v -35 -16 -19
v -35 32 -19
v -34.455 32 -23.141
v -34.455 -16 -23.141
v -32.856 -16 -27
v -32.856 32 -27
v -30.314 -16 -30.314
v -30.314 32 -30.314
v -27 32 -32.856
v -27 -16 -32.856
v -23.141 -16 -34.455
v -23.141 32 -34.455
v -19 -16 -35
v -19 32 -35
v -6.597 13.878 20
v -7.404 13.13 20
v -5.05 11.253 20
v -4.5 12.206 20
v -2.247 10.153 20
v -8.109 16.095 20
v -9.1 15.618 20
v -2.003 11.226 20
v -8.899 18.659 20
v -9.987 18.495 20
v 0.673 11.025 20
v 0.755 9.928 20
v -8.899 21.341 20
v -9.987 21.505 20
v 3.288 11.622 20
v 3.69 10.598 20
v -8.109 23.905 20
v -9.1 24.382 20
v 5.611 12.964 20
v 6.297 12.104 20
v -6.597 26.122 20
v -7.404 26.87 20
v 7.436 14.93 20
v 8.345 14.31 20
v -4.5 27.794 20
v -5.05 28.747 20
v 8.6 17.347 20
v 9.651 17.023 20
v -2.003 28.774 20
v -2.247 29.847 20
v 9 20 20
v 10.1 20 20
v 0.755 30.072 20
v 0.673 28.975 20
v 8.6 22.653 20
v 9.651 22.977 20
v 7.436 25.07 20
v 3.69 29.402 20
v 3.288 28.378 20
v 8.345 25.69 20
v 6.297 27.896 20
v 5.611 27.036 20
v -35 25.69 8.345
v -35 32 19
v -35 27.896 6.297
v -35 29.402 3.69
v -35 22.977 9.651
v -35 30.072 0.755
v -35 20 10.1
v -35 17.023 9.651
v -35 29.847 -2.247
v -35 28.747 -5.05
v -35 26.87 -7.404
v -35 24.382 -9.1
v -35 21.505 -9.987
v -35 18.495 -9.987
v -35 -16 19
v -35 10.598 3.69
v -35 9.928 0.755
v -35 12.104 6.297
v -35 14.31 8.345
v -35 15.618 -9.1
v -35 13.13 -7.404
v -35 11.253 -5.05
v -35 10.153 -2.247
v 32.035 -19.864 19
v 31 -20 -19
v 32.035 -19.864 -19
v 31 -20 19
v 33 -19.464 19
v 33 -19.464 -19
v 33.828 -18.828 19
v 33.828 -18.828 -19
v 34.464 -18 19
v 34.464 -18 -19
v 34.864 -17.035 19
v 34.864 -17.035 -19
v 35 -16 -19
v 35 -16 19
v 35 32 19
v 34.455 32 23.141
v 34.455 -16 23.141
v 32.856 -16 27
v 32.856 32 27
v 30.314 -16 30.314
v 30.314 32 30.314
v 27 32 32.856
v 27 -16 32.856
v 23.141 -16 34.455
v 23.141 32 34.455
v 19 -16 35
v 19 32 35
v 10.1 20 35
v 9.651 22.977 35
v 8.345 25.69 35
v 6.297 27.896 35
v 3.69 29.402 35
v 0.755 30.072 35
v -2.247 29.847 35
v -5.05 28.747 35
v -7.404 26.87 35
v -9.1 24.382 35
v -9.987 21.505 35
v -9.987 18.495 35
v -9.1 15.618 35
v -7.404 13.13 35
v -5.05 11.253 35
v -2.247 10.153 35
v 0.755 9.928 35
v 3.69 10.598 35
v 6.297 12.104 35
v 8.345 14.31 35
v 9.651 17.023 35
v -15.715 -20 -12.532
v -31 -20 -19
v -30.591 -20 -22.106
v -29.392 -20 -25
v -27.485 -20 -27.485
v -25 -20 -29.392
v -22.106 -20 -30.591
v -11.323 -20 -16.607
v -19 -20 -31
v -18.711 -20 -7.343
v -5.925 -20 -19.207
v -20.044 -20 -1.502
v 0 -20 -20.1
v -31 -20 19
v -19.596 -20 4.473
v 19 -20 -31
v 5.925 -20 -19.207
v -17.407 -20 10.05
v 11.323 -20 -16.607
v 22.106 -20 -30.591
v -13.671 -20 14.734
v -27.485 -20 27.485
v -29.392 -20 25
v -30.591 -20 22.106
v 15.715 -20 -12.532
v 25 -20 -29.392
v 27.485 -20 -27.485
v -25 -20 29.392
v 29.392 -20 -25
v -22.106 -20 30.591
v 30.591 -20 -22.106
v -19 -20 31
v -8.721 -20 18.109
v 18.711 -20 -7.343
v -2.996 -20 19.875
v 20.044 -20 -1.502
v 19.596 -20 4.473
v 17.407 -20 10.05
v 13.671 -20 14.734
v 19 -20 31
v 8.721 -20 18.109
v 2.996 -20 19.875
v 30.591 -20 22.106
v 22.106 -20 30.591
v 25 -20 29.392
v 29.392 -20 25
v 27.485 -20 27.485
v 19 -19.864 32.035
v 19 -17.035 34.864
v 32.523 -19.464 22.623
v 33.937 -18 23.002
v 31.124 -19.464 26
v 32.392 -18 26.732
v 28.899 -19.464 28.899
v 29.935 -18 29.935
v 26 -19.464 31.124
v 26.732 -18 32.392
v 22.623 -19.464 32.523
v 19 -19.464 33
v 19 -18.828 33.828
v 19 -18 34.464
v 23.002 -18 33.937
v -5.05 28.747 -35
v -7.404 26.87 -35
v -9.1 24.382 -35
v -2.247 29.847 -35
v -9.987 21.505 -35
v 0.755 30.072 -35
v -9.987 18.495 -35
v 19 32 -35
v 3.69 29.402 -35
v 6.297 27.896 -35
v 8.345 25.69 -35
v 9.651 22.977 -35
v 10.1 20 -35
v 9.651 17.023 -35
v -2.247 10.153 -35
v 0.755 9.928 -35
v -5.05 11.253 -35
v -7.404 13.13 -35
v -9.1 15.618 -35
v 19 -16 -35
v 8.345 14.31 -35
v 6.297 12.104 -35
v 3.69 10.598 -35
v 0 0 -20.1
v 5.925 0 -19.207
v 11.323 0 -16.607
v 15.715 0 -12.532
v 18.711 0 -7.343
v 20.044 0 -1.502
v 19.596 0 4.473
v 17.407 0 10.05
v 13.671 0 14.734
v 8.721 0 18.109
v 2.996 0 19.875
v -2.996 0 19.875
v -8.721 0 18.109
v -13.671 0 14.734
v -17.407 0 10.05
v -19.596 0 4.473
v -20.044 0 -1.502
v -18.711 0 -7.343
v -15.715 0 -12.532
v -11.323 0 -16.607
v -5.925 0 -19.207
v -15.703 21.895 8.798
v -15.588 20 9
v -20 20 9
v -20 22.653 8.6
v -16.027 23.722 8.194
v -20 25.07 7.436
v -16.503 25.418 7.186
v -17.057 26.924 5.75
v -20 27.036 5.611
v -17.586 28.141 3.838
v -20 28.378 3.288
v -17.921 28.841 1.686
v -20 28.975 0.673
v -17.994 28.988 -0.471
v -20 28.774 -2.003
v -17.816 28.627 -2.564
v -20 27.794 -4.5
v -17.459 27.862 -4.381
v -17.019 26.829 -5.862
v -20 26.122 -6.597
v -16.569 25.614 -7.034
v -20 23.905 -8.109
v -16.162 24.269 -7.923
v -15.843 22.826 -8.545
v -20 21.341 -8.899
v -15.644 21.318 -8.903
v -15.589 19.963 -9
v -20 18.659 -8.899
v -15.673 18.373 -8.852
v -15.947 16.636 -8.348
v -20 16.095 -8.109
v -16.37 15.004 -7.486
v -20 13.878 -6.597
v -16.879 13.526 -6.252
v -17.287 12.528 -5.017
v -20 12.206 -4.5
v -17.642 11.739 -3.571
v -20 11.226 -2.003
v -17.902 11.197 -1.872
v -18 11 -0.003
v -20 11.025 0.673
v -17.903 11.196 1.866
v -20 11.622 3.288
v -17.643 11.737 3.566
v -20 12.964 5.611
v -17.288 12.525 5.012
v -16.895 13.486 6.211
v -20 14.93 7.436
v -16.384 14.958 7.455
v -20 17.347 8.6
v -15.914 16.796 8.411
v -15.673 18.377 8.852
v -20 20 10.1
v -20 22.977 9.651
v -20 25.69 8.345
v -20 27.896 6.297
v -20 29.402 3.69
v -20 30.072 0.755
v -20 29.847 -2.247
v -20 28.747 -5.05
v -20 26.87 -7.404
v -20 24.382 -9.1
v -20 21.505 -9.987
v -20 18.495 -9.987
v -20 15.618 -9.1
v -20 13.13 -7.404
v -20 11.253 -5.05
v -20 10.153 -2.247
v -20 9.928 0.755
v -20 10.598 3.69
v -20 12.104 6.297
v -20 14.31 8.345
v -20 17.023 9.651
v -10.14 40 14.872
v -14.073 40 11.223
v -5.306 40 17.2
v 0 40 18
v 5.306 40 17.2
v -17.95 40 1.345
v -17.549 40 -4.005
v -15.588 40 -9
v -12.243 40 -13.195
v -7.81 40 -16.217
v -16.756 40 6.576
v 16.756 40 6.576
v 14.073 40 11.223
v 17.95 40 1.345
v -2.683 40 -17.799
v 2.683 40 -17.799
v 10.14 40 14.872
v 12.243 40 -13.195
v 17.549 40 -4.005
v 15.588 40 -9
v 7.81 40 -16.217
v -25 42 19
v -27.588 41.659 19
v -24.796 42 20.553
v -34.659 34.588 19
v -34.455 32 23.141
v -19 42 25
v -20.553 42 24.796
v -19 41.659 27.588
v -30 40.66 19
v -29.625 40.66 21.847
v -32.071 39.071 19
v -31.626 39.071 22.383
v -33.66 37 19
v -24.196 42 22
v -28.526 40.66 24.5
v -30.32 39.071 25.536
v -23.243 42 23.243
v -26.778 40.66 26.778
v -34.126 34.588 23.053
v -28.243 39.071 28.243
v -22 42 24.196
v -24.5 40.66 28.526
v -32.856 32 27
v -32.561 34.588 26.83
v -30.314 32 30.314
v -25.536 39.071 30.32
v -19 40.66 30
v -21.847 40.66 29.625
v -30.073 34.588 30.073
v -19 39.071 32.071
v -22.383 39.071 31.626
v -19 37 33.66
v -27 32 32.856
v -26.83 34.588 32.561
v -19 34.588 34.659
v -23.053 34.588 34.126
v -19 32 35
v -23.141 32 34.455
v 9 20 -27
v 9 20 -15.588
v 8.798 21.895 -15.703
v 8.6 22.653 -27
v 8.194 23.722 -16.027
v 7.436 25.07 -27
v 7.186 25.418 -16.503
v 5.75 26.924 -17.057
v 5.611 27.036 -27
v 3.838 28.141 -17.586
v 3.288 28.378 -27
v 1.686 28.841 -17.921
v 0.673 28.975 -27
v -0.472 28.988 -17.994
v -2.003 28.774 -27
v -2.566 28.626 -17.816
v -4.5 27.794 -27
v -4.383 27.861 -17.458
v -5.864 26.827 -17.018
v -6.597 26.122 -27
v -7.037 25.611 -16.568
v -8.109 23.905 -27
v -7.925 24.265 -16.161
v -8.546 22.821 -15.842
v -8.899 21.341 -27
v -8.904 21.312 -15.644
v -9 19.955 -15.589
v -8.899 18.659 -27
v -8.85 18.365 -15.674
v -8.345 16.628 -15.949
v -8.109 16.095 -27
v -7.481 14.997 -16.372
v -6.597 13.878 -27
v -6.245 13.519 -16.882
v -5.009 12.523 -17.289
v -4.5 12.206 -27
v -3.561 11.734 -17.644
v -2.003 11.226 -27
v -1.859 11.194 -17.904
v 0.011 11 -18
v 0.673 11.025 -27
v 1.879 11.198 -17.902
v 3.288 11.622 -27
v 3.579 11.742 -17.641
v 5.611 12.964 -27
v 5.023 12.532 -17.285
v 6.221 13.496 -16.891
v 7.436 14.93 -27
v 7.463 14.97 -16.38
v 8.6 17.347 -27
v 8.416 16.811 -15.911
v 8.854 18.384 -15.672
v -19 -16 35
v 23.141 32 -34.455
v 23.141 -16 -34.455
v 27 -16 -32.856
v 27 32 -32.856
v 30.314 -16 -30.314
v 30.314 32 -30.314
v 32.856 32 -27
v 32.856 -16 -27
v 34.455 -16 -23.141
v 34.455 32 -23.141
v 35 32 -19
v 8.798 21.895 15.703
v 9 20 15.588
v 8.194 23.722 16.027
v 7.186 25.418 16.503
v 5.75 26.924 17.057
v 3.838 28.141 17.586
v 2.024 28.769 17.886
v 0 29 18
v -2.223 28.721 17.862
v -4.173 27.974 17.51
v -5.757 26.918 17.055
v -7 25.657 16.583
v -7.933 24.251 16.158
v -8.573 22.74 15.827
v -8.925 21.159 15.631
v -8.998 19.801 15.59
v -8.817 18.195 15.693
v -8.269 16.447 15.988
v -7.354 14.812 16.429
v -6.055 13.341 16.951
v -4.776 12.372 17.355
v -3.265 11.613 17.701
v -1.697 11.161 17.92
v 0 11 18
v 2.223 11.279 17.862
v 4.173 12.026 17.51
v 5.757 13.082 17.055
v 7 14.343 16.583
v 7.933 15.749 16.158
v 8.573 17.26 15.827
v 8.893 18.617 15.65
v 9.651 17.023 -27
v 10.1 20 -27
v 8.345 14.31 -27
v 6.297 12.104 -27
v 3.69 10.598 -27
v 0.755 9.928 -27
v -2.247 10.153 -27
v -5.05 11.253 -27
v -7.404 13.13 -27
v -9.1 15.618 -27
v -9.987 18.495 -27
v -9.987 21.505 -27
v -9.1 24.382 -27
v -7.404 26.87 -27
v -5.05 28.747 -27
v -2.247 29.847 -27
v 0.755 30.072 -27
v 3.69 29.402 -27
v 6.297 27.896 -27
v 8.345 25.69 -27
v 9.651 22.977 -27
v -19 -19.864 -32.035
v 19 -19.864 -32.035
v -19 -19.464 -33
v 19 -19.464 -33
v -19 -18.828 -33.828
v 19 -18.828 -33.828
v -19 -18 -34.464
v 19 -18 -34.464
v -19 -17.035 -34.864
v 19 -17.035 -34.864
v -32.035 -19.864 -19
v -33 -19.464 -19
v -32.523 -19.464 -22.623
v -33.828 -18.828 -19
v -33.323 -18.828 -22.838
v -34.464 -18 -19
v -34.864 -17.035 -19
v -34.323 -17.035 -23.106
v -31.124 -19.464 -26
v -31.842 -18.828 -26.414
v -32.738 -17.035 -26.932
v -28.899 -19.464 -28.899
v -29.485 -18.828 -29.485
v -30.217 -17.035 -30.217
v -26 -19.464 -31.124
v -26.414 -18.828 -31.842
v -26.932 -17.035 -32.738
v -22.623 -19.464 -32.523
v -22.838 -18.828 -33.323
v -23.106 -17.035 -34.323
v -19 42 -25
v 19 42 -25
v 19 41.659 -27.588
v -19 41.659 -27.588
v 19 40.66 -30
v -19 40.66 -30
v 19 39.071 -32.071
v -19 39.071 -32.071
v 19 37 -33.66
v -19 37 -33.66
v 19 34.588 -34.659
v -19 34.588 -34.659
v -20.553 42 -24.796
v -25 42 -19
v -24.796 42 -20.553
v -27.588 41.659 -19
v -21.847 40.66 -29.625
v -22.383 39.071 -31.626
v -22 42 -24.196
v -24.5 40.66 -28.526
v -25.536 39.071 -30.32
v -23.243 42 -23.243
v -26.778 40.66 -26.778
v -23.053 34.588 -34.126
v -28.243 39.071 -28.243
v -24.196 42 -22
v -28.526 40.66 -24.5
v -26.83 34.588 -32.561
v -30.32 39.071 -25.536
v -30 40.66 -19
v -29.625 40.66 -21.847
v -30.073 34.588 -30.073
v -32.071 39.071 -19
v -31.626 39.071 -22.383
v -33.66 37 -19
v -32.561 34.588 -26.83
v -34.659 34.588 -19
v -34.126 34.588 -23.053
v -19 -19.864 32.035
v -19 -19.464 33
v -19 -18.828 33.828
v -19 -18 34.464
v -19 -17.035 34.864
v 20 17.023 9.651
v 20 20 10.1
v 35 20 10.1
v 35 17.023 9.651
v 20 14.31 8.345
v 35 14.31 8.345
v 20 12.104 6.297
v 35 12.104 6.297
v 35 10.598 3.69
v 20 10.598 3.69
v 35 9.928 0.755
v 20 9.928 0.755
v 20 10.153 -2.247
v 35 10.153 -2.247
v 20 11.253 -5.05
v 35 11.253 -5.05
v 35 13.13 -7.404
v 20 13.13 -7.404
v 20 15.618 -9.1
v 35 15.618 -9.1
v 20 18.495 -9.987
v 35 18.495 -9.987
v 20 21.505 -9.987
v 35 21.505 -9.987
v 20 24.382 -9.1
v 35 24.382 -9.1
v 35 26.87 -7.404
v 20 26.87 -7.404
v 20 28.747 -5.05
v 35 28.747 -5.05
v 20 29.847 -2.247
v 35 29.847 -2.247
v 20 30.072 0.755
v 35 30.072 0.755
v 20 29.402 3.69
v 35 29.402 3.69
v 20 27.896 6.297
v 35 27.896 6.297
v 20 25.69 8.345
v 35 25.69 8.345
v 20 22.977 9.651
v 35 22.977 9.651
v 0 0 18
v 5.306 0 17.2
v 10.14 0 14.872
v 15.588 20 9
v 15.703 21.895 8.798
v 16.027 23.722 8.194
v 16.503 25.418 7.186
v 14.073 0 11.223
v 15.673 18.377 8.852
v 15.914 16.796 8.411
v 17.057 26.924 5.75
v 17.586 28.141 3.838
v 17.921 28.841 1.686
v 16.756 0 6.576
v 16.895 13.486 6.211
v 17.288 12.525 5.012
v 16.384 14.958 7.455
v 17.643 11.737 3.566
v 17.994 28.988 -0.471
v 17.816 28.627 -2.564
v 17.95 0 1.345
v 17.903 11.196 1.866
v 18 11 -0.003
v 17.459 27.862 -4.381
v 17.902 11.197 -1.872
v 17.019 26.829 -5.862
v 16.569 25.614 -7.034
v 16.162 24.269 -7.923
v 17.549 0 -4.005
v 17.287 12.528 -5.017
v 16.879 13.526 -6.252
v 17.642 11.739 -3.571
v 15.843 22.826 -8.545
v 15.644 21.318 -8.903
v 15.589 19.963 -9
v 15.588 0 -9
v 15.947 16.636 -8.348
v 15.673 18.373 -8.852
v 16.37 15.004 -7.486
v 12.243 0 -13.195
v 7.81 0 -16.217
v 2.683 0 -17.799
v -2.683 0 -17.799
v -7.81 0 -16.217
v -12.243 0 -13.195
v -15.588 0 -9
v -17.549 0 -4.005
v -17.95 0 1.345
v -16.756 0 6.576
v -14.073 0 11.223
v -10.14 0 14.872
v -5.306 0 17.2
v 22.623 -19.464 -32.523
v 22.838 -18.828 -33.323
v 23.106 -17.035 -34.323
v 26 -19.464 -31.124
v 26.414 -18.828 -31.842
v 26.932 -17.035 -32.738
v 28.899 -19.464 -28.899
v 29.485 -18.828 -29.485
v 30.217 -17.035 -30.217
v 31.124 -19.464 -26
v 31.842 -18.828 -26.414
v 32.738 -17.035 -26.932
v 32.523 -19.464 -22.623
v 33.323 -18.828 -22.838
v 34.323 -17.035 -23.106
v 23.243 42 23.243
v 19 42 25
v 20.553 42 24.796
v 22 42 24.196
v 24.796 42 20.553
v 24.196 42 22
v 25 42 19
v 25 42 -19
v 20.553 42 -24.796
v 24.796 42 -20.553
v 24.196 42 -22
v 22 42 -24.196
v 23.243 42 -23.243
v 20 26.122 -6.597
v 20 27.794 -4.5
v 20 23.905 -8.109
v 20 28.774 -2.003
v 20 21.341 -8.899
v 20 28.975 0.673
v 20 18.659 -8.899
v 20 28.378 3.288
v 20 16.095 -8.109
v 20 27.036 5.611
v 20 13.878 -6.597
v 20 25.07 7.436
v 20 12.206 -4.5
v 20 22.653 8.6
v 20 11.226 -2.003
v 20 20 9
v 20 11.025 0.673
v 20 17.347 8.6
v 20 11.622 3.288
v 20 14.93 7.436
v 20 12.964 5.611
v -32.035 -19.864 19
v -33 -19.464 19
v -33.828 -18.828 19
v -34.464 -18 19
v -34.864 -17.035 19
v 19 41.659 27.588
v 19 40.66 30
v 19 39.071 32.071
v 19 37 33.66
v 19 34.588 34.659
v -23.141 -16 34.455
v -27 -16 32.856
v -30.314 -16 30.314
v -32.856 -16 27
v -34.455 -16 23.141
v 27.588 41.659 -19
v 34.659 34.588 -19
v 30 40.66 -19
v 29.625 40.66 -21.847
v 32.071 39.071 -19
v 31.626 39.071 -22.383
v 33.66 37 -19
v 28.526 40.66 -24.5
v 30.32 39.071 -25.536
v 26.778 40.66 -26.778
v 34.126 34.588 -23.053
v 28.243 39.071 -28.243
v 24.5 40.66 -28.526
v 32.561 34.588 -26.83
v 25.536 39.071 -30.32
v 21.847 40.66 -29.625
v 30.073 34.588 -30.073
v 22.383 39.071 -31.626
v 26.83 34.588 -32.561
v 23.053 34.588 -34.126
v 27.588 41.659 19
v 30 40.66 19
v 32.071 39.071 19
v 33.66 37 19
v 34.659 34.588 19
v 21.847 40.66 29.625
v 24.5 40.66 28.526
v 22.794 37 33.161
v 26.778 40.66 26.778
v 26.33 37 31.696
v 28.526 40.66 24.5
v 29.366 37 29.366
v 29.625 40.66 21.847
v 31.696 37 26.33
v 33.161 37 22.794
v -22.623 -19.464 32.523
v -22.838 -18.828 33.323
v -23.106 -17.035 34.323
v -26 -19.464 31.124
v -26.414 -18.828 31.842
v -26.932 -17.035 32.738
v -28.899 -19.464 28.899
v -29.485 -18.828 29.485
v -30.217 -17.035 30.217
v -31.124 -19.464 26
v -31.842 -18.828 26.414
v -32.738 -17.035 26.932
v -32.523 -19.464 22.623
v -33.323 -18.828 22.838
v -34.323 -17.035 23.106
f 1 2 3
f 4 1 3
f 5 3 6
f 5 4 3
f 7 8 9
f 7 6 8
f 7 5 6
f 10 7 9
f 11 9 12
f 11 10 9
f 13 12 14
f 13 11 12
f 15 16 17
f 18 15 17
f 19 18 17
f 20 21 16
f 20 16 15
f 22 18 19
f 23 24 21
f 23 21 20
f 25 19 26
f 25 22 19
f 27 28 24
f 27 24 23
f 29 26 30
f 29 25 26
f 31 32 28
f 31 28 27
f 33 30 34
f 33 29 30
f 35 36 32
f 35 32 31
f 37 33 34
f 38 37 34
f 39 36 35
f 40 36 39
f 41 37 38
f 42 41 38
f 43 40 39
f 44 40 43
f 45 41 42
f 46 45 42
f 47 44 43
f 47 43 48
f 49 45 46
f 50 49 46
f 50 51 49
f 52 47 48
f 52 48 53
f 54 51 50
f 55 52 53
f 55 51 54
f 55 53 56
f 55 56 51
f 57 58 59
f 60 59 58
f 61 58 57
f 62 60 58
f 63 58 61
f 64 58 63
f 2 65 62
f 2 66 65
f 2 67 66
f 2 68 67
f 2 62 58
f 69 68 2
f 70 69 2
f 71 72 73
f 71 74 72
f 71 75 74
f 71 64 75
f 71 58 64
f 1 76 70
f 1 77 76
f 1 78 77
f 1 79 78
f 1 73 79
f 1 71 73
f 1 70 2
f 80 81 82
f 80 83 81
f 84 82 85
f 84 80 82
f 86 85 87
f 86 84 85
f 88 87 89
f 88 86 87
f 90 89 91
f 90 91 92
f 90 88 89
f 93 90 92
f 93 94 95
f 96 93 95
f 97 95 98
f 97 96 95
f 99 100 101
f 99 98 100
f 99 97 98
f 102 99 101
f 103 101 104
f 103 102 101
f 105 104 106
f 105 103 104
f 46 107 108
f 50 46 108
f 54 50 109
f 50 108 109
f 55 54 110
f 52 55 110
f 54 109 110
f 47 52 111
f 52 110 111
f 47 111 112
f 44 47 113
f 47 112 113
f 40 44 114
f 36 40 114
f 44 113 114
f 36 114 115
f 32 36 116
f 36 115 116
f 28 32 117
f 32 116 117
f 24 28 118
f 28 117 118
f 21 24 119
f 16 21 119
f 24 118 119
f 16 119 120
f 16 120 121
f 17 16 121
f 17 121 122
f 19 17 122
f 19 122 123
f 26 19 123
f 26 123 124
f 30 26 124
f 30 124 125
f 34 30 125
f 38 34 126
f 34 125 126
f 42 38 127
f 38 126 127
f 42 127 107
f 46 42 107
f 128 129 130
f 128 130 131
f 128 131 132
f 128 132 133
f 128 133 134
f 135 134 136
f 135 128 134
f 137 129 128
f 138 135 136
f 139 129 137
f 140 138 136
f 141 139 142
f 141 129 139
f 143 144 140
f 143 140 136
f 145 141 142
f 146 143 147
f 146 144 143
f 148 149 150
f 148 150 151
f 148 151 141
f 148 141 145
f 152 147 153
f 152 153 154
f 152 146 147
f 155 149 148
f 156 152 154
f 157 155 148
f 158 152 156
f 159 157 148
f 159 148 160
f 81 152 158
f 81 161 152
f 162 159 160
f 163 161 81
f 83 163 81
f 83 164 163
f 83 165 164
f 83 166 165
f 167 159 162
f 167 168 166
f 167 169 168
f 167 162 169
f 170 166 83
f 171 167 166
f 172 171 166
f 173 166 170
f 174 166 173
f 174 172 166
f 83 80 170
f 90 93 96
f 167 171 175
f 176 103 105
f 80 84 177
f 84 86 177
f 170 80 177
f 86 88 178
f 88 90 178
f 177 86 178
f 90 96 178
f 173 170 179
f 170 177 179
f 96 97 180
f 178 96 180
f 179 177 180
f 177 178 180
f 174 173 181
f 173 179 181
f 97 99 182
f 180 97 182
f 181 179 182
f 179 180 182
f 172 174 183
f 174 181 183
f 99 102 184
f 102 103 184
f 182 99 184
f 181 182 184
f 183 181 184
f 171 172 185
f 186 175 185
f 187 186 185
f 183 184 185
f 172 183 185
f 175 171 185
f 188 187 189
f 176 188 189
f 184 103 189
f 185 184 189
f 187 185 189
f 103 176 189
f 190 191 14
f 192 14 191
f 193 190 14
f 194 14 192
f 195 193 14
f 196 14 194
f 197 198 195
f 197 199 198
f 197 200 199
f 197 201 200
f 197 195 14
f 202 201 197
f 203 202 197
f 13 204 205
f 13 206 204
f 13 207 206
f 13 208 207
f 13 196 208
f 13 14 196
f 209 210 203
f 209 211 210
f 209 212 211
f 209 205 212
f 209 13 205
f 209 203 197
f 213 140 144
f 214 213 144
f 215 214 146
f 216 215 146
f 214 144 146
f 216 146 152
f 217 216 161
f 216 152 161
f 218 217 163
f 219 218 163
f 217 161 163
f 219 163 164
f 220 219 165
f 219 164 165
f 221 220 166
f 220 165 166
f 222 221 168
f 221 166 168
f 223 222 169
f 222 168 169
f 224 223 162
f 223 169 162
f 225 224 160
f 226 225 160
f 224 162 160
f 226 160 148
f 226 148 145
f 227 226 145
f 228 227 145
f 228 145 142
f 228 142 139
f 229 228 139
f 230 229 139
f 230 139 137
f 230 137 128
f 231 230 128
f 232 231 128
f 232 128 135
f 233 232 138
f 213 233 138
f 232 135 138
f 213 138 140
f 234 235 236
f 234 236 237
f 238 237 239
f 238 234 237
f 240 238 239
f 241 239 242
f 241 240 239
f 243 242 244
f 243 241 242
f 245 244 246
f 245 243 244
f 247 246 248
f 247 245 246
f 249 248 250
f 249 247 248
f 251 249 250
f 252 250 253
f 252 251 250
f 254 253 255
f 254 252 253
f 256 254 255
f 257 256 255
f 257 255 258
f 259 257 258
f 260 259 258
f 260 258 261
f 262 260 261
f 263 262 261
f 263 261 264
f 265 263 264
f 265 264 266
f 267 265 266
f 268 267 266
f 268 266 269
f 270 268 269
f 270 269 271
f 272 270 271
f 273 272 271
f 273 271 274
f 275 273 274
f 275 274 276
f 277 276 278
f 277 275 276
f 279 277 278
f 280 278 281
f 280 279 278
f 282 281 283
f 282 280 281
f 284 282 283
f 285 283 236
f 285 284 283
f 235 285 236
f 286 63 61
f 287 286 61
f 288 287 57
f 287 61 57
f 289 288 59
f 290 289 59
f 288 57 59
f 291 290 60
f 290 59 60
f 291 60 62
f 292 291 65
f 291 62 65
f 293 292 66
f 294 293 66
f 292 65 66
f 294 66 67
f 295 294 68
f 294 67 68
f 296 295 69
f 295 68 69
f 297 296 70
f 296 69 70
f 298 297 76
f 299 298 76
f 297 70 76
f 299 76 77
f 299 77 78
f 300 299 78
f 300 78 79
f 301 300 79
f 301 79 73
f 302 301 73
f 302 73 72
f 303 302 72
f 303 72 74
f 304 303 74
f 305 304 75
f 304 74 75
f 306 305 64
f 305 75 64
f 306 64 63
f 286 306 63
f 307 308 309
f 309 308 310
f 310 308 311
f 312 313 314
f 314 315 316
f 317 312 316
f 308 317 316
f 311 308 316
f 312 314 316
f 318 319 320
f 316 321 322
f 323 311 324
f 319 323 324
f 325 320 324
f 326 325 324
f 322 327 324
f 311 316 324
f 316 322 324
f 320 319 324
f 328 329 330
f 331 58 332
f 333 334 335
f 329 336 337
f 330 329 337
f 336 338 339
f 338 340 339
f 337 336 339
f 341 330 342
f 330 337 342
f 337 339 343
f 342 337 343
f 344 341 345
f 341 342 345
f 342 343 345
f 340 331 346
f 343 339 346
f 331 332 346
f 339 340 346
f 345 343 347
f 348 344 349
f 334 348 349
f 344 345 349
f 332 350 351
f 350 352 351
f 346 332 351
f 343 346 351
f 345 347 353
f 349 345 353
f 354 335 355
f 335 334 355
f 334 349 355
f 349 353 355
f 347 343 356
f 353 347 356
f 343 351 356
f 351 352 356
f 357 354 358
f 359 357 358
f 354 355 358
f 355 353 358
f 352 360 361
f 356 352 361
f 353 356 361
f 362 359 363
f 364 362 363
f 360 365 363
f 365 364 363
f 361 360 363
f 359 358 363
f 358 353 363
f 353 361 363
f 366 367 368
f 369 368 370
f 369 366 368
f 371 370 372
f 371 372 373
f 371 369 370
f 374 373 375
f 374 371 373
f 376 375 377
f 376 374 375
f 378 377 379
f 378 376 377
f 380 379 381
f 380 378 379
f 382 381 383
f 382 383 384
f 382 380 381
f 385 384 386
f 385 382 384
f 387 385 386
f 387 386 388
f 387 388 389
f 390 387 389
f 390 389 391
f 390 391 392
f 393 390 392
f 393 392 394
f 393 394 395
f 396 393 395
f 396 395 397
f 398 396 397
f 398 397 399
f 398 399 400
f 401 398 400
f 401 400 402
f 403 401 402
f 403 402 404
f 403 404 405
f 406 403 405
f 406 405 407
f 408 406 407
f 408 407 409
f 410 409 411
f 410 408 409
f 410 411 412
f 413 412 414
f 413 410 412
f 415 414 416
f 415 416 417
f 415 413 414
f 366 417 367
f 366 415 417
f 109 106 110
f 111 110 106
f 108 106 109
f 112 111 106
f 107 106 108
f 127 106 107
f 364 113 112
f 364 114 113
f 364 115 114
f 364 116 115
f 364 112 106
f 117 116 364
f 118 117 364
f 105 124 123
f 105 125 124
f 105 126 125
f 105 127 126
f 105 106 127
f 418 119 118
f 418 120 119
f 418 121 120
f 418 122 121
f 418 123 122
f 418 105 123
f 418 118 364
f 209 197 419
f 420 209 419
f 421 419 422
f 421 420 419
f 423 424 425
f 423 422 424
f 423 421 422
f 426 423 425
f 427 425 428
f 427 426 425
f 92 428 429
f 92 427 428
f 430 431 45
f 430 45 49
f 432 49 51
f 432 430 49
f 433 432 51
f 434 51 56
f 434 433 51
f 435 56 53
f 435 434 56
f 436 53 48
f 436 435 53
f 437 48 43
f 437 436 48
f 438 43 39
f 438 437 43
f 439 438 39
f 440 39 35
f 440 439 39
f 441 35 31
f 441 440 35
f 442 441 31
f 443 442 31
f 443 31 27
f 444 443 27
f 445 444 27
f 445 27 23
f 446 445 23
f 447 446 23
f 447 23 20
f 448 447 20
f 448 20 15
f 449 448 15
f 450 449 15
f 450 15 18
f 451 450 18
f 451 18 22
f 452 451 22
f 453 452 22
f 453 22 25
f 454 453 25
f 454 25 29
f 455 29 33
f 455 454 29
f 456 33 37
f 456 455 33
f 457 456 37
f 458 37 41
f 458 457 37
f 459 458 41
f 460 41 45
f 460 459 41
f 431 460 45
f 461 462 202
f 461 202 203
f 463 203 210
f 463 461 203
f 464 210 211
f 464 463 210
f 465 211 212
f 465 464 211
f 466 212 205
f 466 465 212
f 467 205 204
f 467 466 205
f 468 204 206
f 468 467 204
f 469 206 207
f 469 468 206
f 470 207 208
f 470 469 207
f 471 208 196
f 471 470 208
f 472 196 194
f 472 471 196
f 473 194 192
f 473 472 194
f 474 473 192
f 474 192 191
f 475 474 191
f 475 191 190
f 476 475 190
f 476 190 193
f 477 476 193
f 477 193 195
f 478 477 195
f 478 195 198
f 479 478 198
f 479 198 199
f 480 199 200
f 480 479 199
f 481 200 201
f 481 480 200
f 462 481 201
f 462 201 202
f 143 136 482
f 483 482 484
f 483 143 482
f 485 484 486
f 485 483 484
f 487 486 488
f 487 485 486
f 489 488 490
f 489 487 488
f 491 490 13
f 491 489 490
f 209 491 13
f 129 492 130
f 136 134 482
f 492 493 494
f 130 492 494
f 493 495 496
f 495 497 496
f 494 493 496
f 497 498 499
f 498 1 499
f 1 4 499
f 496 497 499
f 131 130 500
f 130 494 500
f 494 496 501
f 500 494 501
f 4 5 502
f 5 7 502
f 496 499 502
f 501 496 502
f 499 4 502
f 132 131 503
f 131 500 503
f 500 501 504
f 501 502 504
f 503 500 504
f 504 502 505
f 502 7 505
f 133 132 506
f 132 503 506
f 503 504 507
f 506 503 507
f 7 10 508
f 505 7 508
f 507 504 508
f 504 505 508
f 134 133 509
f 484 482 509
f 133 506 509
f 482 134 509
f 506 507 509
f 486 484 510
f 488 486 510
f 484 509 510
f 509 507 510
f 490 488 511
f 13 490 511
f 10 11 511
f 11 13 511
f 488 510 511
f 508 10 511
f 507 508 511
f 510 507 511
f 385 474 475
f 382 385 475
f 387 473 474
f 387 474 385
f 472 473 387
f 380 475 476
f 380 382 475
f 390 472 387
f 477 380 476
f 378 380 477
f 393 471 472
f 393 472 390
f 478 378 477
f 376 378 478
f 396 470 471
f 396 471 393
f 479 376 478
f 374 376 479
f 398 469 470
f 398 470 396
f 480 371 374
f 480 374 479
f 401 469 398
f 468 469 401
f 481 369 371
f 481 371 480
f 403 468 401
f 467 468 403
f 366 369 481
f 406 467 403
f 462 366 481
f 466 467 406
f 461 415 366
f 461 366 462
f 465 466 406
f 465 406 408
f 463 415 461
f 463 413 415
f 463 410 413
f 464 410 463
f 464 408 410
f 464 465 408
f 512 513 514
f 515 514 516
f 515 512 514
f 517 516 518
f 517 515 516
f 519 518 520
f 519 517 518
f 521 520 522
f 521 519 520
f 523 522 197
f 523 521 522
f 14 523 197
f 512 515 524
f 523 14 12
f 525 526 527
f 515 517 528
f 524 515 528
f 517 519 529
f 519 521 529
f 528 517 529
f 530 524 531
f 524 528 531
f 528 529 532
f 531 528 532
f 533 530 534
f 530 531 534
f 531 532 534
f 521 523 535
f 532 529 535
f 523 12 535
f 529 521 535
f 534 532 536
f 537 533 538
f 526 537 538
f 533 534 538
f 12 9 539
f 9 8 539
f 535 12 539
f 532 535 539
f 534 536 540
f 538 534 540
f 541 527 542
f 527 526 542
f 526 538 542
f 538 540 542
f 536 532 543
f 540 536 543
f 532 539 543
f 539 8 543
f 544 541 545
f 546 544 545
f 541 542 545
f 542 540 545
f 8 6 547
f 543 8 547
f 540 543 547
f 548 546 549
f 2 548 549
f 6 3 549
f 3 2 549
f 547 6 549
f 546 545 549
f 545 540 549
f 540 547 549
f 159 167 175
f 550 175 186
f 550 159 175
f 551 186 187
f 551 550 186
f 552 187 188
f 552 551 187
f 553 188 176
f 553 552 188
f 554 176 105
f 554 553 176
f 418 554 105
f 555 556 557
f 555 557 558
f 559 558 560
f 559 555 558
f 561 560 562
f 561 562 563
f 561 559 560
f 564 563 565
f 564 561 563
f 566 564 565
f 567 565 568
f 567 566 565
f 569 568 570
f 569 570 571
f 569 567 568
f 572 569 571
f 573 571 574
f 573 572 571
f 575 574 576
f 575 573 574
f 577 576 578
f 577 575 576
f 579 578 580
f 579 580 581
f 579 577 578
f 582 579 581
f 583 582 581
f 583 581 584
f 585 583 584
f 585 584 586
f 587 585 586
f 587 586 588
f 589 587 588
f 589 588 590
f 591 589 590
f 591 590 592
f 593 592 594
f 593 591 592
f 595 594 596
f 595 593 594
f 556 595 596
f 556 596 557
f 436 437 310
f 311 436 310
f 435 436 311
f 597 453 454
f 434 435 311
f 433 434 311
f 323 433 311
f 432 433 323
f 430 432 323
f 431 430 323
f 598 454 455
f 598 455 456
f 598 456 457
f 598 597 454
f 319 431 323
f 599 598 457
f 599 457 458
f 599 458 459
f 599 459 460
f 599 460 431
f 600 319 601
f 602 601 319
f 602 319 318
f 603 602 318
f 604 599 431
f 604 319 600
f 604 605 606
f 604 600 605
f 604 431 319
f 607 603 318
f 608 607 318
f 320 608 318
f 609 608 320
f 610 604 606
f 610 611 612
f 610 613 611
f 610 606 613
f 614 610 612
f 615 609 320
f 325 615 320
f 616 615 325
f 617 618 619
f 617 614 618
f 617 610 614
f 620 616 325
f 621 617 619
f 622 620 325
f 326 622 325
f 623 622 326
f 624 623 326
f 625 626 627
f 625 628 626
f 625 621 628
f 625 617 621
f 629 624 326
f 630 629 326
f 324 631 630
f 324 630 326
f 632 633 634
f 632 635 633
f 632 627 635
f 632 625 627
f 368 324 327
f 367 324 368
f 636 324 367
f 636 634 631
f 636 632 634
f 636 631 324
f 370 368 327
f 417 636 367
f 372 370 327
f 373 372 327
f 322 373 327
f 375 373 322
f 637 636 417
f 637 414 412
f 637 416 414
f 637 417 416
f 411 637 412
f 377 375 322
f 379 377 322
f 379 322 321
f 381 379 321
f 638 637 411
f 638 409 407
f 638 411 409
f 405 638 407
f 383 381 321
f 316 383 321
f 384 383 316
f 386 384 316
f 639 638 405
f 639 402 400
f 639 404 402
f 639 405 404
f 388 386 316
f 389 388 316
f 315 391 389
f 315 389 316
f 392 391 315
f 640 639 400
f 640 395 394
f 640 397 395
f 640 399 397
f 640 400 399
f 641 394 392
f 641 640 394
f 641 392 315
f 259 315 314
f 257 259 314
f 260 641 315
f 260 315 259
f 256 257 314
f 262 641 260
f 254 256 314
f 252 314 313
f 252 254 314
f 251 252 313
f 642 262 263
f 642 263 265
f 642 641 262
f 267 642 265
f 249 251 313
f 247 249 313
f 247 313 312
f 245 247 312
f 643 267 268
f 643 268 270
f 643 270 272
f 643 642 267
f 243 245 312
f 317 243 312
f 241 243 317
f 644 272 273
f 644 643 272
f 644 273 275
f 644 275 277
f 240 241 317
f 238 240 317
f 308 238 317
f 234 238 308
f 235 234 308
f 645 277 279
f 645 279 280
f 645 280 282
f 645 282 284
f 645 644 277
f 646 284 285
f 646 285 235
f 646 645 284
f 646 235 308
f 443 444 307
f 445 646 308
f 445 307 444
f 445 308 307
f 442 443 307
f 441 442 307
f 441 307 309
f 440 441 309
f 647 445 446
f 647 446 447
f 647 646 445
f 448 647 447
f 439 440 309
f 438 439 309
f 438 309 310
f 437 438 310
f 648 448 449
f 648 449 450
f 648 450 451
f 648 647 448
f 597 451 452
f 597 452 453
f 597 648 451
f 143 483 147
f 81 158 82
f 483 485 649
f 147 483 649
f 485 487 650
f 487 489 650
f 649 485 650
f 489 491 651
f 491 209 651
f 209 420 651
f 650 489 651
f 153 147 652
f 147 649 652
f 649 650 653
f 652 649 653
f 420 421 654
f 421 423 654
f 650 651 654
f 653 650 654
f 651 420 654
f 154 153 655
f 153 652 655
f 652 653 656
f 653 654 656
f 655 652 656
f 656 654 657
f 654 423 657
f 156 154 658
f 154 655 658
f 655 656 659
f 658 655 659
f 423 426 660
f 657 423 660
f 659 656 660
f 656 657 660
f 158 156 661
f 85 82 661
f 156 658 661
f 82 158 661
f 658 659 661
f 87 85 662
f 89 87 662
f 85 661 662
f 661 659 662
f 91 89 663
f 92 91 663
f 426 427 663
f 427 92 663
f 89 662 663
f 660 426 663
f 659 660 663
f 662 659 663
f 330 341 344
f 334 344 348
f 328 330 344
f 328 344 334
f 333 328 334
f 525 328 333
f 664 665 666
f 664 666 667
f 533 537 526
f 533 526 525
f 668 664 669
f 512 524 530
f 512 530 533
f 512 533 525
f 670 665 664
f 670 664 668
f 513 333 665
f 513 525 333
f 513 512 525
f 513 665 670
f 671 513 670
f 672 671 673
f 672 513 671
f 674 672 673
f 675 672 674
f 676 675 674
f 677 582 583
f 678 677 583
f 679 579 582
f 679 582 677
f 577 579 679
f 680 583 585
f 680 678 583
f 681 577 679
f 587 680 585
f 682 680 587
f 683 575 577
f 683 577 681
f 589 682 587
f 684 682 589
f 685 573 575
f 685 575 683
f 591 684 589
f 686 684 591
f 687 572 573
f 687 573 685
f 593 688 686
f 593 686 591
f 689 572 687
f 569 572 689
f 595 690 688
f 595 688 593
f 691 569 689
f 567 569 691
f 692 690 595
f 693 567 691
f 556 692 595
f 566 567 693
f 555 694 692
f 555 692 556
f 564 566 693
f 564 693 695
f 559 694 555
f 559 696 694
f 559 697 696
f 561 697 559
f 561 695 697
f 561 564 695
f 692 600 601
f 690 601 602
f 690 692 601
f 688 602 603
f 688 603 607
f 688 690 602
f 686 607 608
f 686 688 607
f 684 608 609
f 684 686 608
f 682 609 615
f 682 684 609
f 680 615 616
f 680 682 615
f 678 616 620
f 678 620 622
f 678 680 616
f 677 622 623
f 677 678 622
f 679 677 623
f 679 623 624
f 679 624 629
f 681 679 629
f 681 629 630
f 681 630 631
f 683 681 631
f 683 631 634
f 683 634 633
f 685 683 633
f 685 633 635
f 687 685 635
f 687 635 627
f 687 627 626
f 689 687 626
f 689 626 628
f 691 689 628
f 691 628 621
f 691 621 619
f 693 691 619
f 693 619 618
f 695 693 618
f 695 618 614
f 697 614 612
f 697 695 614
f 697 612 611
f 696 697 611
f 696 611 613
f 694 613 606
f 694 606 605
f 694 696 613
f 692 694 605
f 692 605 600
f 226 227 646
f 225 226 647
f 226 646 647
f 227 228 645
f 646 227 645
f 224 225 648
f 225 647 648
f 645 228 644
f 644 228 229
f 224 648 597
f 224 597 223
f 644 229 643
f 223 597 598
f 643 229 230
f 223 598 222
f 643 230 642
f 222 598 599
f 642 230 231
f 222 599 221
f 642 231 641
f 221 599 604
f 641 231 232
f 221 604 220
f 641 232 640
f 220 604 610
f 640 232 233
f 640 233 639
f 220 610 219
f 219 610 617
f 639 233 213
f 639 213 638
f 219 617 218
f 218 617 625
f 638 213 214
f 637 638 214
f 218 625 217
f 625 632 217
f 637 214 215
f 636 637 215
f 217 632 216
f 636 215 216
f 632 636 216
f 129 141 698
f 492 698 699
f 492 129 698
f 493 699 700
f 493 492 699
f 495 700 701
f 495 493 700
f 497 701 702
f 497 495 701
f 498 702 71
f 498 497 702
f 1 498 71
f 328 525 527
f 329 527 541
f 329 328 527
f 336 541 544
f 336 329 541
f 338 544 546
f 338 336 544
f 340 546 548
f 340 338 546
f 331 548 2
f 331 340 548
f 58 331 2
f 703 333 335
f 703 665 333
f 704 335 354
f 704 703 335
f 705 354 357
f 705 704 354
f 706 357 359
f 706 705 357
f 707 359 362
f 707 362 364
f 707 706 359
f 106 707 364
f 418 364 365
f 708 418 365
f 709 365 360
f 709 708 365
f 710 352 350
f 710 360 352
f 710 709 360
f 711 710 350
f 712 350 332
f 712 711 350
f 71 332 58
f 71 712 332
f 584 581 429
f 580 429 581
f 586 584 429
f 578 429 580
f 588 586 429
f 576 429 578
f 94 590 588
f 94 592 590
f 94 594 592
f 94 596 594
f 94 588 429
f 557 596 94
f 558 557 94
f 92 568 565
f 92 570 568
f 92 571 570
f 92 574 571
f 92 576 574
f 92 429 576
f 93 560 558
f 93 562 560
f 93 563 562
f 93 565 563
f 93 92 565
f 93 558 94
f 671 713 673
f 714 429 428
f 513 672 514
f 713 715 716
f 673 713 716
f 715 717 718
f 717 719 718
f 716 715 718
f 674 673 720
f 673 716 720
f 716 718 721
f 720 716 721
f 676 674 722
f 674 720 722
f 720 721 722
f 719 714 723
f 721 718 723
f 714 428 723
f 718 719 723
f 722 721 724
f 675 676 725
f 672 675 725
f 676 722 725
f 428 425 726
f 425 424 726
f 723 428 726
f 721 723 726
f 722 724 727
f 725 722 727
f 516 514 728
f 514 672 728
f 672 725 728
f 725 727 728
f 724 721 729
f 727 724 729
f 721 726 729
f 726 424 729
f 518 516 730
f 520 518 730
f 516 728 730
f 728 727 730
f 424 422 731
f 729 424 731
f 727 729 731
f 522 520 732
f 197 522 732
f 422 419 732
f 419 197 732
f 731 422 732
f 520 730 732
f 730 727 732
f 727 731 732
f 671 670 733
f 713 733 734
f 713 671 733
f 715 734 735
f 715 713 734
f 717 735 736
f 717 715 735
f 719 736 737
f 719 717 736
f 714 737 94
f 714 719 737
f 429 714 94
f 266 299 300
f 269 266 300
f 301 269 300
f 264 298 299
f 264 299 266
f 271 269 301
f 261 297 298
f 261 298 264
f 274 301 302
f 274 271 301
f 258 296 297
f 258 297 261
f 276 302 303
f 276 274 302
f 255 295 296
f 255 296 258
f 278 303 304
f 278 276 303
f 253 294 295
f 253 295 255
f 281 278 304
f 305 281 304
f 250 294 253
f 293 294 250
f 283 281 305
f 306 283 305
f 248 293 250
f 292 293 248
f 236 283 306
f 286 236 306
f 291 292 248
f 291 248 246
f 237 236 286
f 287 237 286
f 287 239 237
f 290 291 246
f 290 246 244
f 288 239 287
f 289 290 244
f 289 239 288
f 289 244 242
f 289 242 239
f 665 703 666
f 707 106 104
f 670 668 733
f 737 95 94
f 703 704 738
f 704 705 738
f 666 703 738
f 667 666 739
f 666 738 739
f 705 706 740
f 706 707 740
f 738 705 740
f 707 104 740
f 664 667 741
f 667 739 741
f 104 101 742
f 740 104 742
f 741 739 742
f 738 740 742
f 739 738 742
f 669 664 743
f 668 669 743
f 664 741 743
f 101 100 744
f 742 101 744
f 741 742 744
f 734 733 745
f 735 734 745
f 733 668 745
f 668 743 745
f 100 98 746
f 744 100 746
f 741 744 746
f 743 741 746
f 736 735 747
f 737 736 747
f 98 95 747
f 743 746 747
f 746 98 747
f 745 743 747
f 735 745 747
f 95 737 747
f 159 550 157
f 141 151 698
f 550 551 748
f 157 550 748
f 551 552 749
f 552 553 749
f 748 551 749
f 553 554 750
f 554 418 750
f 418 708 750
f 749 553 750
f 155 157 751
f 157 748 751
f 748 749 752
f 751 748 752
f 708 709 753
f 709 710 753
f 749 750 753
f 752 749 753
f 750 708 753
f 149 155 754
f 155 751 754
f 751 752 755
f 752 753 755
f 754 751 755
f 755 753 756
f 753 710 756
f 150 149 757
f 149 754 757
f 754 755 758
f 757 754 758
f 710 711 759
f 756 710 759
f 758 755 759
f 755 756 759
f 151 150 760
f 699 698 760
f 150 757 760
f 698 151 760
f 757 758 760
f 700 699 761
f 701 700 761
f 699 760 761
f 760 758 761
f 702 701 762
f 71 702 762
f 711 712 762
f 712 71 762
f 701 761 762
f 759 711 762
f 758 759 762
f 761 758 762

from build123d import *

# Parameters (mm, degrees)
SKETCH_1_R               = 18
EXTRUDE_1_DEPTH          = 40
CUT_EXTRUDE_2_DEPTH      = 88.891979156
CUT_EXTRUDE_2_DEPTH_BACK = 88.891979156
SKETCH_2_R               = 9
SKETCH_3_R               = 10.1
CUT_EXTRUDE_3_DEPTH      = 15
CUT_EXTRUDE_START        = -15
SKETCH_4_R               = 10.1
CUT_EXTRUDE_4_DEPTH      = 15
CUT_EXTRUDE_5_DEPTH      = 88.891979202
CUT_EXTRUDE_5_DEPTH_BACK = 88.891979202
SKETCH_5_R               = 9
SKETCH_6_R               = 10.1
CUT_EXTRUDE_6_DEPTH      = 15
CUT_EXTRUDE_START_2      = -8
SKETCH_7_R               = 10.1
CUT_EXTRUDE_7_DEPTH      = 8
EXTRUDE_2_DEPTH          = 2
FILLET_1_R               = 10
EXTRUDE_START            = 20
SKETCH_10_R              = 20.1
EXTRUDE_3_DEPTH          = 20
FILLET_2_R               = 4


with BuildPart() as part:
    # Эскиз1 → Бобышка-Вытянуть1 (new body)
    with BuildSketch(Plane(origin=(0, 0, 0), x_dir=(1, 0, 0), z_dir=(0, 1, 0))):
        with BuildLine():
            Line((19, 35), (-19, 35))
            ThreePointArc((-19, 35), (-30.313708499, 30.313708499), (-35, 19))
            Line((-35, 19), (-35, -19))
            ThreePointArc((-35, -19), (-30.313708499, -30.313708499), (-19, -35))
            Line((-19, -35), (19, -35))
            ThreePointArc((19, -35), (30.313708499, -30.313708499), (35, -19))
            Line((35, -19), (35, 19))
            ThreePointArc((35, 19), (30.313708499, 30.313708499), (19, 35))
        make_face()
        with Locations(Location((0, 0, 0), (0, 0, 270))):
            Circle(SKETCH_1_R, mode=Mode.SUBTRACT)
    extrude(amount=EXTRUDE_1_DEPTH)

    # Эскиз2 → Вырез-Вытянуть2 (cut, two sides: drawn at the far end of the back side and taken through both)
    with BuildSketch(Plane.ZY.offset(35).offset(-CUT_EXTRUDE_2_DEPTH_BACK)):
        with Locations((0, 20)):
            Circle(SKETCH_2_R)
    extrude(amount=CUT_EXTRUDE_2_DEPTH + CUT_EXTRUDE_2_DEPTH_BACK, mode=Mode.SUBTRACT)

    # Эскиз3 → Вырез-Вытянуть3 (cut)
    with BuildSketch(Plane.ZY.offset(35)):
        with Locations((0, 20)):
            Circle(SKETCH_3_R)
    extrude(amount=-CUT_EXTRUDE_3_DEPTH, mode=Mode.SUBTRACT)

    # Эскиз4 → Вырез-Вытянуть4 (cut)
    with BuildSketch(Plane(origin=(35, 0, 0), x_dir=(0, 0, -1), z_dir=(1, 0, 0)).offset(CUT_EXTRUDE_START)):
        with Locations(Location((0, 20, 0), (0, 0, 180))):
            Circle(SKETCH_4_R)
    extrude(amount=CUT_EXTRUDE_4_DEPTH, mode=Mode.SUBTRACT)

    # Эскиз5 → Вырез-Вытянуть5 (cut, two sides: drawn at the far end of the back side and taken through both)
    with BuildSketch(Plane.XY.offset(35).offset(-CUT_EXTRUDE_5_DEPTH_BACK)):
        with Locations((0, 20)):
            Circle(SKETCH_5_R)
    extrude(amount=CUT_EXTRUDE_5_DEPTH + CUT_EXTRUDE_5_DEPTH_BACK, mode=Mode.SUBTRACT)

    # Эскиз6 → Вырез-Вытянуть6 (cut)
    with BuildSketch(Plane.XY.offset(35)):
        with Locations((0, 20)):
            Circle(SKETCH_6_R)
    extrude(amount=-CUT_EXTRUDE_6_DEPTH, mode=Mode.SUBTRACT)

    # Эскиз7 → Вырез-Вытянуть7 (cut)
    with BuildSketch(Plane(origin=(0, 0, -35), x_dir=(-1, 0, 0), z_dir=(0, 0, -1)).offset(CUT_EXTRUDE_START_2)):
        with Locations(Location((0, 20, 0), (0, 0, 180))):
            Circle(SKETCH_7_R)
    extrude(amount=CUT_EXTRUDE_7_DEPTH, mode=Mode.SUBTRACT)

    # Эскиз9 → Бобышка-Вытянуть2 (add)
    with BuildSketch(Plane(origin=(0, 40, 0), x_dir=(1, 0, 0), z_dir=(0, 1, 0))):
        with BuildLine():
            Line((35, -19), (35, 19))
            ThreePointArc((35, 19), (30.313708499, 30.313708499), (19, 35))
            Line((19, 35), (-19, 35))
            ThreePointArc((-19, 35), (-30.313708499, 30.313708499), (-35, 19))
            Line((-35, 19), (-35, -19))
            ThreePointArc((-35, -19), (-30.313708499, -30.313708499), (-19, -35))
            Line((-19, -35), (19, -35))
            ThreePointArc((19, -35), (30.313708499, -30.313708499), (35, -19))
        make_face()
    extrude(amount=EXTRUDE_2_DEPTH)

    # Скругление1
    fillet_1_edges = [part.edges().sort_by_distance(p)[0] for p in [
        (30.313708499, 42, 30.313708499),
        (35, 42, 0),
        (30.313708499, 42, -30.313708499),
        (0, 42, -35),
        (-30.313708499, 42, -30.313708499),
        (-35, 42, 0),
        (-30.313708499, 42, 30.313708499),
        (0, 42, 35),
    ]]
    fillet(fillet_1_edges, radius=FILLET_1_R)

    # Эскиз10 → Бобышка-Вытянуть3 (add)
    with BuildSketch(Plane.XZ.offset(EXTRUDE_START)):
        with BuildLine():
            Line((19, 35), (-19, 35))
            ThreePointArc((-19, 35), (-30.313708499, 30.313708499), (-35, 19))
            Line((-35, 19), (-35, -19))
            ThreePointArc((-35, -19), (-30.313708499, -30.313708499), (-19, -35))
            Line((-19, -35), (19, -35))
            ThreePointArc((19, -35), (30.313708499, -30.313708499), (35, -19))
            Line((35, -19), (35, 19))
            ThreePointArc((35, 19), (30.313708499, 30.313708499), (19, 35))
        make_face()
        with Locations(Location((0, 0, 0), (0, 0, 270))):
            Circle(SKETCH_10_R, mode=Mode.SUBTRACT)
    extrude(amount=-EXTRUDE_3_DEPTH)

    # Скругление2
    fillet_2_edges = [part.edges().sort_by_distance(p)[0] for p in [
        (30.313708499, -20, 30.313708499),
        (0, -20, 35),
        (-30.313708499, -20, 30.313708499),
        (-35, -20, 0),
        (-30.313708499, -20, -30.313708499),
        (0, -20, -35),
        (30.313708499, -20, -30.313708499),
        (35, -20, 0),
    ]]
    fillet(fillet_2_edges, radius=FILLET_2_R)


solid = part.part
